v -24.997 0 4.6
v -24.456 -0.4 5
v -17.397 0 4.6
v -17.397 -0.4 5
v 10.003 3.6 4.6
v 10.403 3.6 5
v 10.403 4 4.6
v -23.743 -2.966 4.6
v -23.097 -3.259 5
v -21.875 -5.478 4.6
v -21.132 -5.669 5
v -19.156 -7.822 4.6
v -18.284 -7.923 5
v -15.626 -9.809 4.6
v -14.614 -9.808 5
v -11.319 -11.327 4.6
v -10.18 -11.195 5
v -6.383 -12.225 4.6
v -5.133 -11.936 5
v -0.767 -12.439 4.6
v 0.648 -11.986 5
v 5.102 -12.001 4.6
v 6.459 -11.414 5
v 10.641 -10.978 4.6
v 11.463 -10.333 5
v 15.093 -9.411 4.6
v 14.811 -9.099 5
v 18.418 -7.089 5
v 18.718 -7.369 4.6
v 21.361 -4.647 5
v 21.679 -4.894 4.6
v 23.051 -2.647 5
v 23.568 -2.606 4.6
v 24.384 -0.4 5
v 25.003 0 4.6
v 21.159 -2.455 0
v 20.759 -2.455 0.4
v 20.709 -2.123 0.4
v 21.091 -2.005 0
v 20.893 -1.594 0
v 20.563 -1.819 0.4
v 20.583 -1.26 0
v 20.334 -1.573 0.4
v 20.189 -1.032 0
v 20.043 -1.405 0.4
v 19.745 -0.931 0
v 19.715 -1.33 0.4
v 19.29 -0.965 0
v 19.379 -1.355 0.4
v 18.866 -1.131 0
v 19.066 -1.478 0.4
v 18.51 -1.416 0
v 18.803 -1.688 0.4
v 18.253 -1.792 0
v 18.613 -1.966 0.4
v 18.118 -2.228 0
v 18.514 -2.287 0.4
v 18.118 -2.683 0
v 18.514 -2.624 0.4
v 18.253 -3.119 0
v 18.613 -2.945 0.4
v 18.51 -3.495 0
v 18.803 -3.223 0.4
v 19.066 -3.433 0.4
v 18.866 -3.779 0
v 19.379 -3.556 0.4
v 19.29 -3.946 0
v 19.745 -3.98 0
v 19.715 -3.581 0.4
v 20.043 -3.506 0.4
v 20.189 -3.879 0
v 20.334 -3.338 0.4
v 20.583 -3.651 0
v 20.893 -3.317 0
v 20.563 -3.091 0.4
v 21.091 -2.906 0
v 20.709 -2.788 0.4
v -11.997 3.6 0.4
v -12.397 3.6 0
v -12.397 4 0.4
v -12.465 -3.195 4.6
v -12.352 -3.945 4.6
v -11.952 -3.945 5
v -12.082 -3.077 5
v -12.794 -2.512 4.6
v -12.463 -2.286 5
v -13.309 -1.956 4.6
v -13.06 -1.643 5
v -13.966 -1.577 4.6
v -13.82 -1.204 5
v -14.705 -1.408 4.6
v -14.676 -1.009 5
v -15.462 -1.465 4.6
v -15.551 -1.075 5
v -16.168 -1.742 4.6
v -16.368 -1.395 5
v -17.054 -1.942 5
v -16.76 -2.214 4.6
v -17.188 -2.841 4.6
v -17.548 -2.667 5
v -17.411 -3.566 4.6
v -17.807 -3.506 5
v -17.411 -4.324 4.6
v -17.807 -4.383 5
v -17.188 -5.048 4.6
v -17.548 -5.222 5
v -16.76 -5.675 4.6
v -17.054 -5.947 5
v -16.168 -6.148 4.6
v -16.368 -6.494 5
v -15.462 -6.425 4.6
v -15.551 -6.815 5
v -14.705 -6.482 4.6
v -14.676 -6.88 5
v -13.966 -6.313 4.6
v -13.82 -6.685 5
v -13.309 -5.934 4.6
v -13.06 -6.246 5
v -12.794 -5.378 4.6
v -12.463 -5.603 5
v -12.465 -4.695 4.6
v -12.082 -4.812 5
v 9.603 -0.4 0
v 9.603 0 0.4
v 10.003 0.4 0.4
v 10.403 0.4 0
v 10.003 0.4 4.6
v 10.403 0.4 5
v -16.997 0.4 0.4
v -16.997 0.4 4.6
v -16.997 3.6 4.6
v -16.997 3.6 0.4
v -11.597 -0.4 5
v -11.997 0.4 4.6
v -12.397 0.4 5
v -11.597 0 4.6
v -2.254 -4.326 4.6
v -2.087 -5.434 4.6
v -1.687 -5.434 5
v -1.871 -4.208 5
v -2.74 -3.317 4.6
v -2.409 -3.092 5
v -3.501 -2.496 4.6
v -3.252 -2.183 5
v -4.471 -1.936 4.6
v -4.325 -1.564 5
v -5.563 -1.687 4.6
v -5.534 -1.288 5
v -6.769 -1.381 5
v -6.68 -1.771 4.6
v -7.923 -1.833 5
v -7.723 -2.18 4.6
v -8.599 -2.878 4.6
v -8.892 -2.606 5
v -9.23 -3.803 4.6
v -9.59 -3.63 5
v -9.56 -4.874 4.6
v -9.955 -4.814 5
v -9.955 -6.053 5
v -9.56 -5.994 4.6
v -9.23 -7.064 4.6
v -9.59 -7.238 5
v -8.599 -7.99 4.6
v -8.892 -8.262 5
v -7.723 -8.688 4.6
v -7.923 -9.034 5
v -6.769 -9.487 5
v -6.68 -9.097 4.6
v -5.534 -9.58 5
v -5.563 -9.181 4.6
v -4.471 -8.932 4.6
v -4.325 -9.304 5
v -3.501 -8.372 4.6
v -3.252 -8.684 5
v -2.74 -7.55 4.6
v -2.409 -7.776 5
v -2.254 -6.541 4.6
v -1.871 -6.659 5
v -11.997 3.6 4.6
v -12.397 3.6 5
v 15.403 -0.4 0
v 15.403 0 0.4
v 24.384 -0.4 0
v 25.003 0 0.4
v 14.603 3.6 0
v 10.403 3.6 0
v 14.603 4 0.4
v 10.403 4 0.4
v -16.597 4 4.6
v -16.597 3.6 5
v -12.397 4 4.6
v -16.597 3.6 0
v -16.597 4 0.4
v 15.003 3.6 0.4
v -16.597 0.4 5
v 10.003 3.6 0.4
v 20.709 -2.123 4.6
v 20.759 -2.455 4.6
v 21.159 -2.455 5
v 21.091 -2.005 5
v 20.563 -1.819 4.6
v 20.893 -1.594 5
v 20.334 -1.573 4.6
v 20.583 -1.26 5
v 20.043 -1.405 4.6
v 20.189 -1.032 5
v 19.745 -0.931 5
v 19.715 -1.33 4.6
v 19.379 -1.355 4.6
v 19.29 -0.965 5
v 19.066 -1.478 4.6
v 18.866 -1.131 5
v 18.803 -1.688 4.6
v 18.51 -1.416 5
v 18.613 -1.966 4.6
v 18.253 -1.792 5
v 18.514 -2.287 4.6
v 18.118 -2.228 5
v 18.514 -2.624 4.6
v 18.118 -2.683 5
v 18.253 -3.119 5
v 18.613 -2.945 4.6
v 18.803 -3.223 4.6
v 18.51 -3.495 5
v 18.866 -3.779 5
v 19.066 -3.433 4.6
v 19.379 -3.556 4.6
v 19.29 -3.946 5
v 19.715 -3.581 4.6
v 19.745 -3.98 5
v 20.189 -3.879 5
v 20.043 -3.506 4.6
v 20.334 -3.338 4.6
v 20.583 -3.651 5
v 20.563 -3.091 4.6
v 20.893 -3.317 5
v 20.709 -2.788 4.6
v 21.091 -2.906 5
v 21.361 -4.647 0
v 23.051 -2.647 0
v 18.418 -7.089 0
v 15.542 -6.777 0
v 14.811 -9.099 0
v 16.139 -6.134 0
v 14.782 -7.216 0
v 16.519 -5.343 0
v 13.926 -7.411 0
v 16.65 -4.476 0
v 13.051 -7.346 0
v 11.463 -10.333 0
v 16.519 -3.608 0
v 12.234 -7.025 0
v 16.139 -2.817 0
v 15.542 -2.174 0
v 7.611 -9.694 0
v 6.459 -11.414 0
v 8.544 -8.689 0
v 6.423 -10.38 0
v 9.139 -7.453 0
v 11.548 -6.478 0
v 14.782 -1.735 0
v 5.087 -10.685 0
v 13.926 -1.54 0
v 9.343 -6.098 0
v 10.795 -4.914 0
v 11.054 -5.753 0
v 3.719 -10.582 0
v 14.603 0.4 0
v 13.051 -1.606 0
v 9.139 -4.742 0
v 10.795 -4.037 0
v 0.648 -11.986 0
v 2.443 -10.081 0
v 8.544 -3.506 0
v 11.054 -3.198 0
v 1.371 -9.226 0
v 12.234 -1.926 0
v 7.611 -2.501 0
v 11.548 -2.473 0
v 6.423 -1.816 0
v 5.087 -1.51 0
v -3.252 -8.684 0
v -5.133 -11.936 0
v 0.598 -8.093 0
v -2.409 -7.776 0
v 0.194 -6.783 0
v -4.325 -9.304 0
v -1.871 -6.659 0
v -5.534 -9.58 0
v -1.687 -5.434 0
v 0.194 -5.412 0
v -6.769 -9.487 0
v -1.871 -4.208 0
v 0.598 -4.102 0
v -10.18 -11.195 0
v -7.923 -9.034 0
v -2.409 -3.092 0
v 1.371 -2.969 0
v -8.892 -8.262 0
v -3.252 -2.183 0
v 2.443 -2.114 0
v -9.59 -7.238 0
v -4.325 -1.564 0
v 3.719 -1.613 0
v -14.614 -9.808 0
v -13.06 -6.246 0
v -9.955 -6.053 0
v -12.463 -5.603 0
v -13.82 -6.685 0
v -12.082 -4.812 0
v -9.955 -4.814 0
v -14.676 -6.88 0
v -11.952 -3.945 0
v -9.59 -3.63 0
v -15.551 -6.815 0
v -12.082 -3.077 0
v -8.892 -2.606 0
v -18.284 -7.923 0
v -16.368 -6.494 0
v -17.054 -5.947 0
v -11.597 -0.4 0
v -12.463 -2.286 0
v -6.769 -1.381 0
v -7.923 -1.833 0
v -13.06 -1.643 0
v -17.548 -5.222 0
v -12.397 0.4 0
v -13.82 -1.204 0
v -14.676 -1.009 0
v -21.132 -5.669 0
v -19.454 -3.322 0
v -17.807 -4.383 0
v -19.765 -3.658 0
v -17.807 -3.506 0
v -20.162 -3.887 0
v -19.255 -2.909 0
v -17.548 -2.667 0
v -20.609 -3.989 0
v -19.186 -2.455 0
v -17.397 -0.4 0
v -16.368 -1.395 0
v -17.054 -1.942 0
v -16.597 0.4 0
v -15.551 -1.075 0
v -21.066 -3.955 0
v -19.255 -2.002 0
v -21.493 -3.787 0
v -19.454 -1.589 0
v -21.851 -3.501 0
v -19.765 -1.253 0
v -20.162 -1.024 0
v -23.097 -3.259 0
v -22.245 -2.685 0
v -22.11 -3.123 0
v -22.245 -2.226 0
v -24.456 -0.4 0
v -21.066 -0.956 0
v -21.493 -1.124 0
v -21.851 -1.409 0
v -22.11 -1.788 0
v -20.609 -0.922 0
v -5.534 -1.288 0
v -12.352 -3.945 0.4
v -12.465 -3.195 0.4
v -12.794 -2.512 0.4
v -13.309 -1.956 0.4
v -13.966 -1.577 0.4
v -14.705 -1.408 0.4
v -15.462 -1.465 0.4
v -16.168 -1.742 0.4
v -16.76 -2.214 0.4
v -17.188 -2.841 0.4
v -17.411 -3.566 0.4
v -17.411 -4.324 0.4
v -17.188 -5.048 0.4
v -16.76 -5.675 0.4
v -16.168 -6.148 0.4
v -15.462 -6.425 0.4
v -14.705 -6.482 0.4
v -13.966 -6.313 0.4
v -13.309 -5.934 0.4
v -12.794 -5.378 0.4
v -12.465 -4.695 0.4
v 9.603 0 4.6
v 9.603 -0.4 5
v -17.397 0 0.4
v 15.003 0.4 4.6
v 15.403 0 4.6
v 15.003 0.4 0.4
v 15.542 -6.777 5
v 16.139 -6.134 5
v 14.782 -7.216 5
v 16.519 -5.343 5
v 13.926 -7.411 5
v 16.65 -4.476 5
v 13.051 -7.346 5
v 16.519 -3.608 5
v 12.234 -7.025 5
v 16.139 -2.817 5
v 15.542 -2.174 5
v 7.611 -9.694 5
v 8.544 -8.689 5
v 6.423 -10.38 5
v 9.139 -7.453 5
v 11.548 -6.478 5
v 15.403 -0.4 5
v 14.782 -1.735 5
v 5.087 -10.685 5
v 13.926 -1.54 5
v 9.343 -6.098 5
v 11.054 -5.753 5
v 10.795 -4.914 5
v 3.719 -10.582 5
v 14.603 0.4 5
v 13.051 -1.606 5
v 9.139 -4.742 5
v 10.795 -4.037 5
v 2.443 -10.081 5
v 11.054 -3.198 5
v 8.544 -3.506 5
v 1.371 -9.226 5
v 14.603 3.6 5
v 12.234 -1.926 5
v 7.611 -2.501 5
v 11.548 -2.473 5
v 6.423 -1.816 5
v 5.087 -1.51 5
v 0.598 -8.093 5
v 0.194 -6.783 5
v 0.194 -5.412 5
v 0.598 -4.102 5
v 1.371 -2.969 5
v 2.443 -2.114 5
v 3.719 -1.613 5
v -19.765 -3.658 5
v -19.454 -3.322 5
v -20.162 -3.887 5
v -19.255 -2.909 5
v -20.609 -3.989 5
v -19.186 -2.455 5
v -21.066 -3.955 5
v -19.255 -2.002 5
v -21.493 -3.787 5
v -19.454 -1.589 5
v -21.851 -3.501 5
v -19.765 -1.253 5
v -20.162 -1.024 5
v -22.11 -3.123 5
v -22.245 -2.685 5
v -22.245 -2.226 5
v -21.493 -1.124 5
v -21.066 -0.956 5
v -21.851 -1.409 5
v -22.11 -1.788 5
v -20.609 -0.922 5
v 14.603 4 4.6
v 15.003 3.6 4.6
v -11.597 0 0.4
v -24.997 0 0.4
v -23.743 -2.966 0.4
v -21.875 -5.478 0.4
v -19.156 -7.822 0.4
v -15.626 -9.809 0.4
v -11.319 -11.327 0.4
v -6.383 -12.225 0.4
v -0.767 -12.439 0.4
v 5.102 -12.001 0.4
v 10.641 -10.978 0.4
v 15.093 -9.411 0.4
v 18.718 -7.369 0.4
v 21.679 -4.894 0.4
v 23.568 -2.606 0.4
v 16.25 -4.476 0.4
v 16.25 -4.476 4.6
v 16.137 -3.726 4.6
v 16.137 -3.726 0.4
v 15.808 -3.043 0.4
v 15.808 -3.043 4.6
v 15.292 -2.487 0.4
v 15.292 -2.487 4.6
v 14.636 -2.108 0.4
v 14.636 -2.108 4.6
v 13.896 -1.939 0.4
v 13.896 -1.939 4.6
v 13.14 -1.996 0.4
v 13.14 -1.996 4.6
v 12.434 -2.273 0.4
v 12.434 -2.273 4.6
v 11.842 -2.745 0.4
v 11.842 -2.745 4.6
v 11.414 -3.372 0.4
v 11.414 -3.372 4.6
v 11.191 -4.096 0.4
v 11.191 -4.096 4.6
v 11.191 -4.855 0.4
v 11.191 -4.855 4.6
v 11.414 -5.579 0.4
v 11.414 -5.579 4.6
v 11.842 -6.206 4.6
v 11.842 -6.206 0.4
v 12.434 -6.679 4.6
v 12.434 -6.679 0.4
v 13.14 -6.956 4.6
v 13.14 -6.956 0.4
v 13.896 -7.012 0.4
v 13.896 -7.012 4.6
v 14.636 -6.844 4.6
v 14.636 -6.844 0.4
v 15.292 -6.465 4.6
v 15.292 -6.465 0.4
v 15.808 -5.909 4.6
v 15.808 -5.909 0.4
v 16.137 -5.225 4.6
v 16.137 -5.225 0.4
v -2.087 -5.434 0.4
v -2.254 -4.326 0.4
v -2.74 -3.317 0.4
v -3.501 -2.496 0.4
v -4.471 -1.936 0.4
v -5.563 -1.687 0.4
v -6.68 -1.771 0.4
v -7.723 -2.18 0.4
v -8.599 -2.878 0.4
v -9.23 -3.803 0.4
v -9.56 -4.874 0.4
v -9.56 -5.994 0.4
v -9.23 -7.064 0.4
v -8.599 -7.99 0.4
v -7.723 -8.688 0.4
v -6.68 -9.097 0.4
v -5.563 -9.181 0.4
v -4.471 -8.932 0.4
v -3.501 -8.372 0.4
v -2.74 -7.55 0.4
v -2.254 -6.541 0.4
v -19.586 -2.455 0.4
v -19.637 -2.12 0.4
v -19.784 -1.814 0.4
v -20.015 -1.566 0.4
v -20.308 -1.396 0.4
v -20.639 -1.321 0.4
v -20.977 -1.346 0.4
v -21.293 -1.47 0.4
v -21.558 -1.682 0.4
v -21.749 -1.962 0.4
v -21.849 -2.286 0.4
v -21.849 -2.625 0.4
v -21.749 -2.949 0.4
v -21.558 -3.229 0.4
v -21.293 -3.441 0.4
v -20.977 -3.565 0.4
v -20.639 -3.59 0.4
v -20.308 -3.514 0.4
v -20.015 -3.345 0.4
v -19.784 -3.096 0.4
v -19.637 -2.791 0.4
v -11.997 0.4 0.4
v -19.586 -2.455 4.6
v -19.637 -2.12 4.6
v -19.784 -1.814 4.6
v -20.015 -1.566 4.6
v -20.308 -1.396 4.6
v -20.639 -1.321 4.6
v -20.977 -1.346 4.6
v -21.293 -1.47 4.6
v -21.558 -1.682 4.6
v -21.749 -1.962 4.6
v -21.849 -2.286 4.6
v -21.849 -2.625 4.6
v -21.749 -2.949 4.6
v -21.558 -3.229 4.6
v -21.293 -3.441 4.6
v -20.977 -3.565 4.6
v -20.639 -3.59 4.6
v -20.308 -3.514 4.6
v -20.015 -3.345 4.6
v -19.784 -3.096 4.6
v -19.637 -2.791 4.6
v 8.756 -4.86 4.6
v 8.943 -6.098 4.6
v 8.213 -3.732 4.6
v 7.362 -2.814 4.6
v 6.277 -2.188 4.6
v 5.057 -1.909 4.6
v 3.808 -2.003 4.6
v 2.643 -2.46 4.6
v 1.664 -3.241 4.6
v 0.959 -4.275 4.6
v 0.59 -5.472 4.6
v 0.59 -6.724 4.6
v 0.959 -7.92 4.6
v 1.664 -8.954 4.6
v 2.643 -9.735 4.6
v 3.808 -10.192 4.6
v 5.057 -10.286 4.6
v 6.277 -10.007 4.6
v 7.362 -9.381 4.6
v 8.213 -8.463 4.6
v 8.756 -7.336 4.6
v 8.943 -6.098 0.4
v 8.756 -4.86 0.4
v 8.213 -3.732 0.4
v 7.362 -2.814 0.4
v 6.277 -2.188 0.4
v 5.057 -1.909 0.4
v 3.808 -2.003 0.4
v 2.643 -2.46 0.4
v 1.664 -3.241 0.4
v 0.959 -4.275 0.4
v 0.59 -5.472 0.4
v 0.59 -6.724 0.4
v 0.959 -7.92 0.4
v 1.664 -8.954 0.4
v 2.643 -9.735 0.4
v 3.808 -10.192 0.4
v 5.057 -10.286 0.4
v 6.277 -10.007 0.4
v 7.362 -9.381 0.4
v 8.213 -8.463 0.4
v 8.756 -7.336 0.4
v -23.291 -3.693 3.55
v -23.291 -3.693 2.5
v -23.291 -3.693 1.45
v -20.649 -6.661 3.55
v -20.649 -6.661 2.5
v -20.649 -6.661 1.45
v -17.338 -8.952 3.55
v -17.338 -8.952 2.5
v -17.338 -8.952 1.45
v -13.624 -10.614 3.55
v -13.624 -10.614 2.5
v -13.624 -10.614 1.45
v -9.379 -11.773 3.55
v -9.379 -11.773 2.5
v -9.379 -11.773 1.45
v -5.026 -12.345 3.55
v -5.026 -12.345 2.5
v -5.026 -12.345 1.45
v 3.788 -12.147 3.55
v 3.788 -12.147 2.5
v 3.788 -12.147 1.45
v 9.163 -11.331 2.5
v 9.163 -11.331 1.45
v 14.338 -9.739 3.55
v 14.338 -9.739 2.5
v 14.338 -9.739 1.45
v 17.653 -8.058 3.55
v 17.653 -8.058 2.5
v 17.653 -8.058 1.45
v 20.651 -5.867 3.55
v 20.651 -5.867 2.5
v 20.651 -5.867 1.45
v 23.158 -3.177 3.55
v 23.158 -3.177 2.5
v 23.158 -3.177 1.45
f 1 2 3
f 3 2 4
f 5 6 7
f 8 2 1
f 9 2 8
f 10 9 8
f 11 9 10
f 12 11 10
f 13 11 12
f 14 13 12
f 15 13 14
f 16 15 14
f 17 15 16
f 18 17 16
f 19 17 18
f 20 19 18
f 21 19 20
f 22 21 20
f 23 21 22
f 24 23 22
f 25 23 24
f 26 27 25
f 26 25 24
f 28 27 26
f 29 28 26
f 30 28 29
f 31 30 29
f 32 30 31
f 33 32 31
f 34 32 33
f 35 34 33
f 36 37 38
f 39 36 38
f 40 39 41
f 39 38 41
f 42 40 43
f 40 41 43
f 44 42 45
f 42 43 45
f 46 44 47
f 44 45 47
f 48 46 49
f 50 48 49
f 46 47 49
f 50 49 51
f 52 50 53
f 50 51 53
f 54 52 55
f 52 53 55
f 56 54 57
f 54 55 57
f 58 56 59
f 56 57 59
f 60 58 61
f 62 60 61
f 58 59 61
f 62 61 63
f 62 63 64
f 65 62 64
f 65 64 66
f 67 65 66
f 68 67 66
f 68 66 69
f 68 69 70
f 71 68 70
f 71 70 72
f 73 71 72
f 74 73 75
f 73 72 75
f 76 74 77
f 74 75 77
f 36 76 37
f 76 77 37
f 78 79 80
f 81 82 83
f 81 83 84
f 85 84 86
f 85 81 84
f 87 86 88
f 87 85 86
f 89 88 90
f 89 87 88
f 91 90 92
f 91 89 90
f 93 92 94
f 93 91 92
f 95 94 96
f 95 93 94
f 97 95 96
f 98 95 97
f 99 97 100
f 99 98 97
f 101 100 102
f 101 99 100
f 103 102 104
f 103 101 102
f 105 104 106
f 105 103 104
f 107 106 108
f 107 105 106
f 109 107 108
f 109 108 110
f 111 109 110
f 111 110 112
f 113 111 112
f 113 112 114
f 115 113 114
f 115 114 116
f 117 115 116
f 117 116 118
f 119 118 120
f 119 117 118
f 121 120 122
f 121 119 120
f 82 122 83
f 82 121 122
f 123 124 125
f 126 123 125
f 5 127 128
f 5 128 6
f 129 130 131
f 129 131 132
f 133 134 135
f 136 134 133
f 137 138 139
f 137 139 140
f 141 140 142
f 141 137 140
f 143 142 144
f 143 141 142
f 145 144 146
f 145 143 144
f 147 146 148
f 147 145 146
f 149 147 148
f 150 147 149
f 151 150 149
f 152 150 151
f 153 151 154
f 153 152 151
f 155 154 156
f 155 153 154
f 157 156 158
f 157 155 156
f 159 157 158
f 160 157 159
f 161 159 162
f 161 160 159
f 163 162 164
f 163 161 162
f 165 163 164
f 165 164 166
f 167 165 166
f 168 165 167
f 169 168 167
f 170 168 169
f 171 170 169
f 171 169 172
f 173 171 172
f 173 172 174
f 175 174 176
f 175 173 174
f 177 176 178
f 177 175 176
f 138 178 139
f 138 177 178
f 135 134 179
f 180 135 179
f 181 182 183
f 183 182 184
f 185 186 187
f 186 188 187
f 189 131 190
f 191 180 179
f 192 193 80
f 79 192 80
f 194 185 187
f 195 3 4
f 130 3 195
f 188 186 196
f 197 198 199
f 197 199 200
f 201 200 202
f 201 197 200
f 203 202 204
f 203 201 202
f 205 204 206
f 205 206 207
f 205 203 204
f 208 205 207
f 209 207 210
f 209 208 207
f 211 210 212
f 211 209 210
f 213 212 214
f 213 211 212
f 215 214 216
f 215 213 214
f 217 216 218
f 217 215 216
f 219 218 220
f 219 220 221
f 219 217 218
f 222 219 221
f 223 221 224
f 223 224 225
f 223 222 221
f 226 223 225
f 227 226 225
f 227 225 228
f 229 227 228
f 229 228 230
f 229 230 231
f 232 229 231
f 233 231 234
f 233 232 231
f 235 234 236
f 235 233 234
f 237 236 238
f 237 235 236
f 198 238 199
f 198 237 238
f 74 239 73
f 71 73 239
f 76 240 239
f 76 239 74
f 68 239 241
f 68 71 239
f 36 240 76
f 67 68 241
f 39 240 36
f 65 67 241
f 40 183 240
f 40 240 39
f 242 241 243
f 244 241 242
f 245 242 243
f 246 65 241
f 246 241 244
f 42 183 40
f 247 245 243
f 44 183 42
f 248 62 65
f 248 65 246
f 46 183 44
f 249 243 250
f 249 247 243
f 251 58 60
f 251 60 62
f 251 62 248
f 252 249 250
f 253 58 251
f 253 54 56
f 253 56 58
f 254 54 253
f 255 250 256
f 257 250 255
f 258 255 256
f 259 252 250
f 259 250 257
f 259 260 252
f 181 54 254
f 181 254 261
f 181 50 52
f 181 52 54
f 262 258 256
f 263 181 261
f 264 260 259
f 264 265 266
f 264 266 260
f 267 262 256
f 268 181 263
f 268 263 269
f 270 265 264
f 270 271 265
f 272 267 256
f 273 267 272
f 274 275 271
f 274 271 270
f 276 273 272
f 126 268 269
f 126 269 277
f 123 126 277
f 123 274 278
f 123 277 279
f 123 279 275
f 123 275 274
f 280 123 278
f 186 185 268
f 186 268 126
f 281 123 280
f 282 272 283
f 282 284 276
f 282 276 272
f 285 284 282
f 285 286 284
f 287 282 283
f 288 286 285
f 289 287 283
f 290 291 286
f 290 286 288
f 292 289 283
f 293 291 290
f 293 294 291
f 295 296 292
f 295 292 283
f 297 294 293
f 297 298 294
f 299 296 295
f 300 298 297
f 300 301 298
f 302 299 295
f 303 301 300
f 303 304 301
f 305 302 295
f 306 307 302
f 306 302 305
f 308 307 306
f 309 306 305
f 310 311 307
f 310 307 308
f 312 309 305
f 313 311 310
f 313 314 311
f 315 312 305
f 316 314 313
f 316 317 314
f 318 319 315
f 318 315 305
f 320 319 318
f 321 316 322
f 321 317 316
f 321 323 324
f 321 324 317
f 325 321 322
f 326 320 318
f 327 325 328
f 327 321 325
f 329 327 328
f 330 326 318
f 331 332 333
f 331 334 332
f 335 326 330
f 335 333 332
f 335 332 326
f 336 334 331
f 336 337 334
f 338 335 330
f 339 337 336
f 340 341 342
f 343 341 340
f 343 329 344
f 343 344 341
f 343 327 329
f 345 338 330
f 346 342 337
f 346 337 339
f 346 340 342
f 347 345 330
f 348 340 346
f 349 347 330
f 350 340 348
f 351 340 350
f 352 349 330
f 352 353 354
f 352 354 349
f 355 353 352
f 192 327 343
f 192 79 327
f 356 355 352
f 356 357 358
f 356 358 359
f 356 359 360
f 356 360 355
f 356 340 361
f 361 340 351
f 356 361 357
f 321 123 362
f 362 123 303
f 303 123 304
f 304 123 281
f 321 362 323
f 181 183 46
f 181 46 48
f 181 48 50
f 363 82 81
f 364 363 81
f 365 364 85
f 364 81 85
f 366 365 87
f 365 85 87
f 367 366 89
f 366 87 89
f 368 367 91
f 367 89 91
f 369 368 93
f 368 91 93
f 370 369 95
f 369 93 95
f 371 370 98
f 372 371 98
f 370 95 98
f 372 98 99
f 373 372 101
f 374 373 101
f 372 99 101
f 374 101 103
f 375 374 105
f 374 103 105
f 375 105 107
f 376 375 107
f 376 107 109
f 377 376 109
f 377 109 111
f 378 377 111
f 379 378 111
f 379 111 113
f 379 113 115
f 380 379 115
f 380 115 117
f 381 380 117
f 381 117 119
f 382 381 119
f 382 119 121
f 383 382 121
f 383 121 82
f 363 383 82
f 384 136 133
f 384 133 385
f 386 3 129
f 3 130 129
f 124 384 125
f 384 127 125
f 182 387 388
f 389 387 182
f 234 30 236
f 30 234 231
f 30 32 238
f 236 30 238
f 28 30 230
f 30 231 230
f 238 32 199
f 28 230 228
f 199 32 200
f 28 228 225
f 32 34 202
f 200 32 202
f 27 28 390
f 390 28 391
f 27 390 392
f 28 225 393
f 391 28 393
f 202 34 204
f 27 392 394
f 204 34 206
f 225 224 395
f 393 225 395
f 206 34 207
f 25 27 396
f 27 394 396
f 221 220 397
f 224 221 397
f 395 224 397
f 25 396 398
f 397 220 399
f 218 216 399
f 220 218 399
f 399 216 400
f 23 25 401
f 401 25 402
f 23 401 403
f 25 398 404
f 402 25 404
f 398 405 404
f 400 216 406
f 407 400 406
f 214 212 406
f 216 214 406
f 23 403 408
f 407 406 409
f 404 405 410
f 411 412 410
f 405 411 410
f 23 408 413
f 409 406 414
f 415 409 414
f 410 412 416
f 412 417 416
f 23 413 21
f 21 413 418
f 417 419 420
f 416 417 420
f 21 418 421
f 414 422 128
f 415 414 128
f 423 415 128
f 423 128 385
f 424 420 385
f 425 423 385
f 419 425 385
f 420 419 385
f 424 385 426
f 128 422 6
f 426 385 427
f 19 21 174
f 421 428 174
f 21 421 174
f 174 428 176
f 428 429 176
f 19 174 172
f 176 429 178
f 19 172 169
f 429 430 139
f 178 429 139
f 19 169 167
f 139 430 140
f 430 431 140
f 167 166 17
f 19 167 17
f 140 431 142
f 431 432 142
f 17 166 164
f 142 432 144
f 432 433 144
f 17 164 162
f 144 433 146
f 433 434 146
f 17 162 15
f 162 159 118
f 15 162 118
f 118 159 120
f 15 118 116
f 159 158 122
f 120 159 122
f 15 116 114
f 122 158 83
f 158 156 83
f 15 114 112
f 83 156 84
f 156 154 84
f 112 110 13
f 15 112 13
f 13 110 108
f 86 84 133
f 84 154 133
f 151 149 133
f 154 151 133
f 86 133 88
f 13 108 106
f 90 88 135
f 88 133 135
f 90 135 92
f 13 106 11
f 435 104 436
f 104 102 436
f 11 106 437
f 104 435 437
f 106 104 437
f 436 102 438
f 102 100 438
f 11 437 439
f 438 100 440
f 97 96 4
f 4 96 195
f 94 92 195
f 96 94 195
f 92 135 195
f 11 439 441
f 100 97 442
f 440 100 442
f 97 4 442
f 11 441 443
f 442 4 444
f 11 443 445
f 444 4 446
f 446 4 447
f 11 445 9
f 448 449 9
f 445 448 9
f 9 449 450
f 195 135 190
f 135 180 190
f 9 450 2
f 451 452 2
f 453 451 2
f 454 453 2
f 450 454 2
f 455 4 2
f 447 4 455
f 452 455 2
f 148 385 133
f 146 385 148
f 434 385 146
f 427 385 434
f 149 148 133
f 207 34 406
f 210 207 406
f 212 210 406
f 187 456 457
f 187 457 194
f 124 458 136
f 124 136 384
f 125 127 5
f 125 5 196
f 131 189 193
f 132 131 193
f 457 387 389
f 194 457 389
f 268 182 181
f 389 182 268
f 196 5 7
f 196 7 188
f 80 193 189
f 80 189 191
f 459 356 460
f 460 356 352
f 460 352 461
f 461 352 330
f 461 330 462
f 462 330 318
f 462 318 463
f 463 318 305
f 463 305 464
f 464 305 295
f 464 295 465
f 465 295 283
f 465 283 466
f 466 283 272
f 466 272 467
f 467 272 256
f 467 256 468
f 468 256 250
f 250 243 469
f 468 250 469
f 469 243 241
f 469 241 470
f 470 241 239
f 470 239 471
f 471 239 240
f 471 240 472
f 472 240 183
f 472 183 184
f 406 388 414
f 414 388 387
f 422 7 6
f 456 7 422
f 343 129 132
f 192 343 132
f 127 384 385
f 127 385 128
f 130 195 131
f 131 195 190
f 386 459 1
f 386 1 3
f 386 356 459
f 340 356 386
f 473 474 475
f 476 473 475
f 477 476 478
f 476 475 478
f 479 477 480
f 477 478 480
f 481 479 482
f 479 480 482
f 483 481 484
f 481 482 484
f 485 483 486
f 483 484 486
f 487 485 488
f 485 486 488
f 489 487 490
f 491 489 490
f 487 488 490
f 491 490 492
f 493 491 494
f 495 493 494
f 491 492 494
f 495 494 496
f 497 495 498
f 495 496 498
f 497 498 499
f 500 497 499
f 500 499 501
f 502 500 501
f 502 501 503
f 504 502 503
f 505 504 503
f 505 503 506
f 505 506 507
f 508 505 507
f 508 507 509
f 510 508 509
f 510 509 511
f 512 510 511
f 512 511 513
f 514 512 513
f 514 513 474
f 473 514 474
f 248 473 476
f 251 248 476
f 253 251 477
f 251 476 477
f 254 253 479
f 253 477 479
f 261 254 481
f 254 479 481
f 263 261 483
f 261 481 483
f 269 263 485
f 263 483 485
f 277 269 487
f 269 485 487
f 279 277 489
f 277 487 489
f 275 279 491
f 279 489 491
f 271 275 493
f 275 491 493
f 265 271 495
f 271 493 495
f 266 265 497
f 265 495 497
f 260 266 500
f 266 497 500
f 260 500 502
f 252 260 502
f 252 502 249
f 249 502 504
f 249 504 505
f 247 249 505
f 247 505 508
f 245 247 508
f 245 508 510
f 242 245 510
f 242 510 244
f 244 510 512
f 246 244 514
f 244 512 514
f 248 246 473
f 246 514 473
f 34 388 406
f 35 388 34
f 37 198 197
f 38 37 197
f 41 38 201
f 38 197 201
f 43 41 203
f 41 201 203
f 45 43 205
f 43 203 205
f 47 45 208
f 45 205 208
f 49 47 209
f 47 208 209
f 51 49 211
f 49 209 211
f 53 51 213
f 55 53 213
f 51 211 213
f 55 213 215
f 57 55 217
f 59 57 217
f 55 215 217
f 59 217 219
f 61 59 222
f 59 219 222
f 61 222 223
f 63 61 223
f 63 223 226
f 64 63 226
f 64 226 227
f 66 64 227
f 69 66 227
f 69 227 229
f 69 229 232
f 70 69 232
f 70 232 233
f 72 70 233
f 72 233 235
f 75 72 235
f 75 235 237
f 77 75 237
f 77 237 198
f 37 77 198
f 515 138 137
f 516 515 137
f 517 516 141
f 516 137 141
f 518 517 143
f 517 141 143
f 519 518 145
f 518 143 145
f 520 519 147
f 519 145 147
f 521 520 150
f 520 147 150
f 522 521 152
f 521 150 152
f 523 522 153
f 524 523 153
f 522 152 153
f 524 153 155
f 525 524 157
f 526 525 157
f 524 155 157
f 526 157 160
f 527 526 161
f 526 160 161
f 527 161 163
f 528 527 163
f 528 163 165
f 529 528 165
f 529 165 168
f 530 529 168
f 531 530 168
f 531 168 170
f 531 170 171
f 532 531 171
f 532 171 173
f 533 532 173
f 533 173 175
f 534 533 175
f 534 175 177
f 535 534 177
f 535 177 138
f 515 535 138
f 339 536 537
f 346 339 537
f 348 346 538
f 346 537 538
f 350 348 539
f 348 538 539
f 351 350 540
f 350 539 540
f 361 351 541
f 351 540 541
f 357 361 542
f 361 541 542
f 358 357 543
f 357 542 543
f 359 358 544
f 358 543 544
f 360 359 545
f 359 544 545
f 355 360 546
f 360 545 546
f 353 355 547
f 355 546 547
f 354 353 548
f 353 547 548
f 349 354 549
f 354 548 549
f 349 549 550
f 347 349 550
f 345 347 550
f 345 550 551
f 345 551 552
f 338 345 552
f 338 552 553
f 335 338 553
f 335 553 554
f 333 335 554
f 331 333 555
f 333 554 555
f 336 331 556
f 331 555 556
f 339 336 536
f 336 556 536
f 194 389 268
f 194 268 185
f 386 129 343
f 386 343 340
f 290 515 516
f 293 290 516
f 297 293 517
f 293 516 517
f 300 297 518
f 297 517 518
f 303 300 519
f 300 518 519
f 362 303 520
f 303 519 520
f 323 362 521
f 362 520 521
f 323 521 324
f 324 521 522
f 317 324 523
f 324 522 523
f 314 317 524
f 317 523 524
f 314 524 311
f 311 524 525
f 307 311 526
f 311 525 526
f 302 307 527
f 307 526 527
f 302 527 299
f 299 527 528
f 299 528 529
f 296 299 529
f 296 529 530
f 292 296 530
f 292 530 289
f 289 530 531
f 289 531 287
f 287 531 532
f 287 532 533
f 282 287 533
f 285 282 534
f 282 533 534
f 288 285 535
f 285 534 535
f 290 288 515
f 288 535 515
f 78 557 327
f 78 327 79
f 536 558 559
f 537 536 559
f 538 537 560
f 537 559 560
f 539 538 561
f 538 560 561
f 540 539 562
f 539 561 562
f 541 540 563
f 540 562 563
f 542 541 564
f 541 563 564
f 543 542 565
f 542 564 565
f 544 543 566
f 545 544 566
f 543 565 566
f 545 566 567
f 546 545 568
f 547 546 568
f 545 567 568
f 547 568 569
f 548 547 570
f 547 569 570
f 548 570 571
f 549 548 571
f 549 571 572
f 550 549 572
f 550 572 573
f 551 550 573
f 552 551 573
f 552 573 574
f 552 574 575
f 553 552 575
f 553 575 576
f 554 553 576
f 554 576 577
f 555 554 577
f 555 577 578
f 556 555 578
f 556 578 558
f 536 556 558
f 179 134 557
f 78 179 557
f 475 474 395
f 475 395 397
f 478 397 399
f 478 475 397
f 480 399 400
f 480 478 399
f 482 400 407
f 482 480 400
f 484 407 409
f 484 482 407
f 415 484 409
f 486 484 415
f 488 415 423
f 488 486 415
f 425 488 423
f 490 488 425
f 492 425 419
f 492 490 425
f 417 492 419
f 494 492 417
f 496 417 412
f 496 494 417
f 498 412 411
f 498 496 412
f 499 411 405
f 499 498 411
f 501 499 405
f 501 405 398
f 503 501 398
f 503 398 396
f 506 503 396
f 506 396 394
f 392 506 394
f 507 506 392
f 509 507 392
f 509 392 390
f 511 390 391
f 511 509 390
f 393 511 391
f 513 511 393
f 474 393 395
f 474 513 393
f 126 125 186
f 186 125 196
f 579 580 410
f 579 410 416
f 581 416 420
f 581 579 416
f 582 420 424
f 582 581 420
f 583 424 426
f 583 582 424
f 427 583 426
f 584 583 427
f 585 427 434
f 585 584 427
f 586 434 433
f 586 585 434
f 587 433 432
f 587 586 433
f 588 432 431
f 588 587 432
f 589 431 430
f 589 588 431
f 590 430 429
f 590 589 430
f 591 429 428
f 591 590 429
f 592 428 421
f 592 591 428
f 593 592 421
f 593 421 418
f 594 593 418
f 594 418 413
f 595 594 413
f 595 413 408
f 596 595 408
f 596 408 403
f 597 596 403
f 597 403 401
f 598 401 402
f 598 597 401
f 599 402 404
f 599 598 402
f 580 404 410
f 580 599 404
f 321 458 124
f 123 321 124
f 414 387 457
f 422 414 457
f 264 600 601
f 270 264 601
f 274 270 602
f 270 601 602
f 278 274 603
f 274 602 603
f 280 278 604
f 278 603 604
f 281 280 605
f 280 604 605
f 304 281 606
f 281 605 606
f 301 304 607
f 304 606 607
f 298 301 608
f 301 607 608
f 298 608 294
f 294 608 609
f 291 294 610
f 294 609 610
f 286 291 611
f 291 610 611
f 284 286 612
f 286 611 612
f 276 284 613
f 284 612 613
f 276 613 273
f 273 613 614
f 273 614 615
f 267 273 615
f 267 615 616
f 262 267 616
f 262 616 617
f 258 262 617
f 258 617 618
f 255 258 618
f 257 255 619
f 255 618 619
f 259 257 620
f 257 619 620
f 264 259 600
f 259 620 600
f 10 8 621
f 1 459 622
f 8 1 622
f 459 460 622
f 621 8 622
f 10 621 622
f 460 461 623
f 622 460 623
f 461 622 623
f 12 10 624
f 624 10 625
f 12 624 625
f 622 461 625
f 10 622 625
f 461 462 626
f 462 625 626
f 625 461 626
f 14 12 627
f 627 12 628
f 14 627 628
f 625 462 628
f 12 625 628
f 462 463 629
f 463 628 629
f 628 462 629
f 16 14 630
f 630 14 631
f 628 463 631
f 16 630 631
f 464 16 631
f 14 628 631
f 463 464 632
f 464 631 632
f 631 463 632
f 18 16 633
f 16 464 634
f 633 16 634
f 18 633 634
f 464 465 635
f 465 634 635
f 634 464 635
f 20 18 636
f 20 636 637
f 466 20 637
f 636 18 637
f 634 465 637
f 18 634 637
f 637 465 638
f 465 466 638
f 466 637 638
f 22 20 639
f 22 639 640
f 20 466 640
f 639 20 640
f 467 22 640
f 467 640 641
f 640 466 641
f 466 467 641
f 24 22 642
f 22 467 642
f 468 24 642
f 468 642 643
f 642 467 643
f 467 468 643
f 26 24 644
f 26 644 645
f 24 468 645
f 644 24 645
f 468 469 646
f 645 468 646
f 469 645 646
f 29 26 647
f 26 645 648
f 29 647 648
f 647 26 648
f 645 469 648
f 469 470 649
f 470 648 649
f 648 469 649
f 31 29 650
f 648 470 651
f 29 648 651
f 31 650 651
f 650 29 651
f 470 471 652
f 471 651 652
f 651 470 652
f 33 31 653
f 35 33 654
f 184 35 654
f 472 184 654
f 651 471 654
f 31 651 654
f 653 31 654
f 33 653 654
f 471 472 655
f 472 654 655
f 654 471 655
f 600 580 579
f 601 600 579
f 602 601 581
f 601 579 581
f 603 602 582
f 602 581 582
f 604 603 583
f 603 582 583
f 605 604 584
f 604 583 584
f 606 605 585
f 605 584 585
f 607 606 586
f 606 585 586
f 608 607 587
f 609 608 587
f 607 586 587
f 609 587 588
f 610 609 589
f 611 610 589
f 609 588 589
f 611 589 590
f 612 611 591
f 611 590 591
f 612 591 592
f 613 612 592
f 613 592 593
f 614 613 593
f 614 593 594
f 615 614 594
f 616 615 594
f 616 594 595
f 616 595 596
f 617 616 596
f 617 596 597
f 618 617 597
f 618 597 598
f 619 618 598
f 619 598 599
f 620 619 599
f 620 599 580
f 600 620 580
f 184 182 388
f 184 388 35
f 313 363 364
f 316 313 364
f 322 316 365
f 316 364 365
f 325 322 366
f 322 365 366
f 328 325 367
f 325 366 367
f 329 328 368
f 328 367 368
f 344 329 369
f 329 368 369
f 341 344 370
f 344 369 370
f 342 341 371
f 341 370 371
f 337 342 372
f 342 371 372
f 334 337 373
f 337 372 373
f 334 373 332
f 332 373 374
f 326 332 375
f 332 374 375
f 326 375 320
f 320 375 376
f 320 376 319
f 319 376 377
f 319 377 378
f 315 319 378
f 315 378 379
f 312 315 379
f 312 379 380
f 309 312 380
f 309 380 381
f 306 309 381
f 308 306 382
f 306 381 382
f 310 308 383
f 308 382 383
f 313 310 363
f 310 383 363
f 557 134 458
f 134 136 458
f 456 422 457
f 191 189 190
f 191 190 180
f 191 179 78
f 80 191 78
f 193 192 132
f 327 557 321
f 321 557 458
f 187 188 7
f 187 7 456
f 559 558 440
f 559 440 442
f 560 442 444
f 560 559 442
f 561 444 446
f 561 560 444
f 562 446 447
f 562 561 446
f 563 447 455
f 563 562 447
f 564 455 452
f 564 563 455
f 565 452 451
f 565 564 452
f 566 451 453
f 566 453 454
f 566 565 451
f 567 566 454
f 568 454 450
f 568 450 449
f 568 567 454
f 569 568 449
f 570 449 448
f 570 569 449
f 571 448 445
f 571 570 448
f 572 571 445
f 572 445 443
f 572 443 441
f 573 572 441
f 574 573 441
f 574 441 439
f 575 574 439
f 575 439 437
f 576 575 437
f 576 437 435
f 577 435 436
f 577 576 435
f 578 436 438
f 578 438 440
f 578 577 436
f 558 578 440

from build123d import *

# Parameters (mm, degrees)
AUFSATZ_LINEAR_AUSTRAGEN1_DEPTH = 5
SKIZZE2_W                       = 5
SKIZZE2_H                       = 5
AUFSATZ_LINEAR_AUSTRAGEN2_DEPTH = 4
SKIZZE3_R                       = 2.543920863
SKIZZE3_R_2                     = 3.757489783
SKIZZE3_R_3                     = 4.2
SKIZZE3_R_4                     = 1.137730448
SKIZZE3_R_5                     = 1.128844842
SCHNITT_LINEAR_AUSTRAGEN1_DEPTH = 29.376694263
FASE1_SIZE                      = 0.4


with BuildPart() as part:
    # Skizze1 → Aufsatz-Linear austragen1 (new body)
    with BuildSketch(Plane.XY):
        with BuildLine():
            Line((-24.996538994, 0), (25.003461006, 0))
            add(Edge.make_bspline(
                [(-24.996538994, 0), (-23.465552519, -5.427530288), (-13.555397464, -12.470085354), (1.646590995, -12.822293736), (15.822536598, -10.26391571), (23.061031095, -4.555996838), (25.003461006, 0)],
                knots=[0, 0, 0, 0, 0.271573143, 0.567800465, 0.751181327, 1, 1, 1, 1], degree=3))
        make_face()
    extrude(amount=AUFSATZ_LINEAR_AUSTRAGEN1_DEPTH)

    # Skizze2 → Aufsatz-Linear austragen2 (add)
    with BuildSketch(Plane(origin=(0, 0, 0), x_dir=(1, 0, 0), z_dir=(0, 1, 0))):
        with Locations((-14.496538994, -2.5)):
            Rectangle(SKIZZE2_W, SKIZZE2_H)
        with Locations((12.503461006, -2.5)):
            Rectangle(SKIZZE2_W, SKIZZE2_H)
    extrude(amount=AUFSATZ_LINEAR_AUSTRAGEN2_DEPTH)

    # Skizze3 → Schnitt-Linear austragen1 (cut, through all)
    with BuildSketch(Plane.XY.offset(5)):
        with Locations((-14.895570814, -3.944707729)):
            Circle(SKIZZE3_R)
        with Locations((-5.844213974, -5.43378647)):
            Circle(SKIZZE3_R_2)
        with Locations((4.742874088, -6.097546966)):
            Circle(SKIZZE3_R_3)
        with Locations((13.706342424, -4.475649879)):
            Circle(SKIZZE3_R)
        with Locations((-20.724127791, -2.455391304)):
            Circle(SKIZZE3_R_4)
        with Locations((19.630255754, -2.455391304)):
            Circle(SKIZZE3_R_5)
    extrude(amount=-SCHNITT_LINEAR_AUSTRAGEN1_DEPTH, mode=Mode.SUBTRACT)

    # Fase1
    fase1_edges = [part.edges().sort_by_distance(p)[0] for p in [
        (-20.996538994, 0, 0),
        (-16.996538994, 0, 2.5),
        (-20.996538994, 0, 5),
        (-0.269521067, -12.424518261, 0),
        (-16.996538994, 2, 0),
        (20.003461006, 0, 0),
        (-14.496538994, 4, 0),
        (15.003461006, 2, 0),
        (-11.996538994, 2, 0),
        (12.503461006, 4, 0),
        (-0.996538994, 0, 0),
        (10.003461006, 2, 0),
        (0.542874088, -6.097546966, 0),
        (11.162421561, -4.475649879, 0),
        (18.501410913, -2.455391304, 0),
        (-9.601703757, -5.43378647, 0),
        (-17.439491677, -3.944707729, 0),
        (-21.861858238, -2.455391304, 0),
        (-16.996538994, 2, 5),
        (-16.996538994, 4, 2.5),
        (-0.269521067, -12.424518261, 5),
        (20.003461006, 0, 5),
        (-14.496538994, 4, 5),
        (15.003461006, 2, 5),
        (-11.996538994, 2, 5),
        (12.503461006, 4, 5),
        (-0.996538994, 0, 5),
        (10.003461006, 2, 5),
        (0.542874088, -6.097546966, 5),
        (11.162421561, -4.475649879, 5),
        (18.501410913, -2.455391304, 5),
        (-9.601703757, -5.43378647, 5),
        (-17.439491677, -3.944707729, 5),
        (-21.861858238, -2.455391304, 5),
        (15.003461006, 0, 2.5),
        (-11.996538994, 4, 2.5),
        (15.003461006, 4, 2.5),
        (-11.996538994, 0, 2.5),
        (10.003461006, 4, 2.5),
        (10.003461006, 0, 2.5),
    ]]
    chamfer(fase1_edges, length=FASE1_SIZE)


solid = part.part
